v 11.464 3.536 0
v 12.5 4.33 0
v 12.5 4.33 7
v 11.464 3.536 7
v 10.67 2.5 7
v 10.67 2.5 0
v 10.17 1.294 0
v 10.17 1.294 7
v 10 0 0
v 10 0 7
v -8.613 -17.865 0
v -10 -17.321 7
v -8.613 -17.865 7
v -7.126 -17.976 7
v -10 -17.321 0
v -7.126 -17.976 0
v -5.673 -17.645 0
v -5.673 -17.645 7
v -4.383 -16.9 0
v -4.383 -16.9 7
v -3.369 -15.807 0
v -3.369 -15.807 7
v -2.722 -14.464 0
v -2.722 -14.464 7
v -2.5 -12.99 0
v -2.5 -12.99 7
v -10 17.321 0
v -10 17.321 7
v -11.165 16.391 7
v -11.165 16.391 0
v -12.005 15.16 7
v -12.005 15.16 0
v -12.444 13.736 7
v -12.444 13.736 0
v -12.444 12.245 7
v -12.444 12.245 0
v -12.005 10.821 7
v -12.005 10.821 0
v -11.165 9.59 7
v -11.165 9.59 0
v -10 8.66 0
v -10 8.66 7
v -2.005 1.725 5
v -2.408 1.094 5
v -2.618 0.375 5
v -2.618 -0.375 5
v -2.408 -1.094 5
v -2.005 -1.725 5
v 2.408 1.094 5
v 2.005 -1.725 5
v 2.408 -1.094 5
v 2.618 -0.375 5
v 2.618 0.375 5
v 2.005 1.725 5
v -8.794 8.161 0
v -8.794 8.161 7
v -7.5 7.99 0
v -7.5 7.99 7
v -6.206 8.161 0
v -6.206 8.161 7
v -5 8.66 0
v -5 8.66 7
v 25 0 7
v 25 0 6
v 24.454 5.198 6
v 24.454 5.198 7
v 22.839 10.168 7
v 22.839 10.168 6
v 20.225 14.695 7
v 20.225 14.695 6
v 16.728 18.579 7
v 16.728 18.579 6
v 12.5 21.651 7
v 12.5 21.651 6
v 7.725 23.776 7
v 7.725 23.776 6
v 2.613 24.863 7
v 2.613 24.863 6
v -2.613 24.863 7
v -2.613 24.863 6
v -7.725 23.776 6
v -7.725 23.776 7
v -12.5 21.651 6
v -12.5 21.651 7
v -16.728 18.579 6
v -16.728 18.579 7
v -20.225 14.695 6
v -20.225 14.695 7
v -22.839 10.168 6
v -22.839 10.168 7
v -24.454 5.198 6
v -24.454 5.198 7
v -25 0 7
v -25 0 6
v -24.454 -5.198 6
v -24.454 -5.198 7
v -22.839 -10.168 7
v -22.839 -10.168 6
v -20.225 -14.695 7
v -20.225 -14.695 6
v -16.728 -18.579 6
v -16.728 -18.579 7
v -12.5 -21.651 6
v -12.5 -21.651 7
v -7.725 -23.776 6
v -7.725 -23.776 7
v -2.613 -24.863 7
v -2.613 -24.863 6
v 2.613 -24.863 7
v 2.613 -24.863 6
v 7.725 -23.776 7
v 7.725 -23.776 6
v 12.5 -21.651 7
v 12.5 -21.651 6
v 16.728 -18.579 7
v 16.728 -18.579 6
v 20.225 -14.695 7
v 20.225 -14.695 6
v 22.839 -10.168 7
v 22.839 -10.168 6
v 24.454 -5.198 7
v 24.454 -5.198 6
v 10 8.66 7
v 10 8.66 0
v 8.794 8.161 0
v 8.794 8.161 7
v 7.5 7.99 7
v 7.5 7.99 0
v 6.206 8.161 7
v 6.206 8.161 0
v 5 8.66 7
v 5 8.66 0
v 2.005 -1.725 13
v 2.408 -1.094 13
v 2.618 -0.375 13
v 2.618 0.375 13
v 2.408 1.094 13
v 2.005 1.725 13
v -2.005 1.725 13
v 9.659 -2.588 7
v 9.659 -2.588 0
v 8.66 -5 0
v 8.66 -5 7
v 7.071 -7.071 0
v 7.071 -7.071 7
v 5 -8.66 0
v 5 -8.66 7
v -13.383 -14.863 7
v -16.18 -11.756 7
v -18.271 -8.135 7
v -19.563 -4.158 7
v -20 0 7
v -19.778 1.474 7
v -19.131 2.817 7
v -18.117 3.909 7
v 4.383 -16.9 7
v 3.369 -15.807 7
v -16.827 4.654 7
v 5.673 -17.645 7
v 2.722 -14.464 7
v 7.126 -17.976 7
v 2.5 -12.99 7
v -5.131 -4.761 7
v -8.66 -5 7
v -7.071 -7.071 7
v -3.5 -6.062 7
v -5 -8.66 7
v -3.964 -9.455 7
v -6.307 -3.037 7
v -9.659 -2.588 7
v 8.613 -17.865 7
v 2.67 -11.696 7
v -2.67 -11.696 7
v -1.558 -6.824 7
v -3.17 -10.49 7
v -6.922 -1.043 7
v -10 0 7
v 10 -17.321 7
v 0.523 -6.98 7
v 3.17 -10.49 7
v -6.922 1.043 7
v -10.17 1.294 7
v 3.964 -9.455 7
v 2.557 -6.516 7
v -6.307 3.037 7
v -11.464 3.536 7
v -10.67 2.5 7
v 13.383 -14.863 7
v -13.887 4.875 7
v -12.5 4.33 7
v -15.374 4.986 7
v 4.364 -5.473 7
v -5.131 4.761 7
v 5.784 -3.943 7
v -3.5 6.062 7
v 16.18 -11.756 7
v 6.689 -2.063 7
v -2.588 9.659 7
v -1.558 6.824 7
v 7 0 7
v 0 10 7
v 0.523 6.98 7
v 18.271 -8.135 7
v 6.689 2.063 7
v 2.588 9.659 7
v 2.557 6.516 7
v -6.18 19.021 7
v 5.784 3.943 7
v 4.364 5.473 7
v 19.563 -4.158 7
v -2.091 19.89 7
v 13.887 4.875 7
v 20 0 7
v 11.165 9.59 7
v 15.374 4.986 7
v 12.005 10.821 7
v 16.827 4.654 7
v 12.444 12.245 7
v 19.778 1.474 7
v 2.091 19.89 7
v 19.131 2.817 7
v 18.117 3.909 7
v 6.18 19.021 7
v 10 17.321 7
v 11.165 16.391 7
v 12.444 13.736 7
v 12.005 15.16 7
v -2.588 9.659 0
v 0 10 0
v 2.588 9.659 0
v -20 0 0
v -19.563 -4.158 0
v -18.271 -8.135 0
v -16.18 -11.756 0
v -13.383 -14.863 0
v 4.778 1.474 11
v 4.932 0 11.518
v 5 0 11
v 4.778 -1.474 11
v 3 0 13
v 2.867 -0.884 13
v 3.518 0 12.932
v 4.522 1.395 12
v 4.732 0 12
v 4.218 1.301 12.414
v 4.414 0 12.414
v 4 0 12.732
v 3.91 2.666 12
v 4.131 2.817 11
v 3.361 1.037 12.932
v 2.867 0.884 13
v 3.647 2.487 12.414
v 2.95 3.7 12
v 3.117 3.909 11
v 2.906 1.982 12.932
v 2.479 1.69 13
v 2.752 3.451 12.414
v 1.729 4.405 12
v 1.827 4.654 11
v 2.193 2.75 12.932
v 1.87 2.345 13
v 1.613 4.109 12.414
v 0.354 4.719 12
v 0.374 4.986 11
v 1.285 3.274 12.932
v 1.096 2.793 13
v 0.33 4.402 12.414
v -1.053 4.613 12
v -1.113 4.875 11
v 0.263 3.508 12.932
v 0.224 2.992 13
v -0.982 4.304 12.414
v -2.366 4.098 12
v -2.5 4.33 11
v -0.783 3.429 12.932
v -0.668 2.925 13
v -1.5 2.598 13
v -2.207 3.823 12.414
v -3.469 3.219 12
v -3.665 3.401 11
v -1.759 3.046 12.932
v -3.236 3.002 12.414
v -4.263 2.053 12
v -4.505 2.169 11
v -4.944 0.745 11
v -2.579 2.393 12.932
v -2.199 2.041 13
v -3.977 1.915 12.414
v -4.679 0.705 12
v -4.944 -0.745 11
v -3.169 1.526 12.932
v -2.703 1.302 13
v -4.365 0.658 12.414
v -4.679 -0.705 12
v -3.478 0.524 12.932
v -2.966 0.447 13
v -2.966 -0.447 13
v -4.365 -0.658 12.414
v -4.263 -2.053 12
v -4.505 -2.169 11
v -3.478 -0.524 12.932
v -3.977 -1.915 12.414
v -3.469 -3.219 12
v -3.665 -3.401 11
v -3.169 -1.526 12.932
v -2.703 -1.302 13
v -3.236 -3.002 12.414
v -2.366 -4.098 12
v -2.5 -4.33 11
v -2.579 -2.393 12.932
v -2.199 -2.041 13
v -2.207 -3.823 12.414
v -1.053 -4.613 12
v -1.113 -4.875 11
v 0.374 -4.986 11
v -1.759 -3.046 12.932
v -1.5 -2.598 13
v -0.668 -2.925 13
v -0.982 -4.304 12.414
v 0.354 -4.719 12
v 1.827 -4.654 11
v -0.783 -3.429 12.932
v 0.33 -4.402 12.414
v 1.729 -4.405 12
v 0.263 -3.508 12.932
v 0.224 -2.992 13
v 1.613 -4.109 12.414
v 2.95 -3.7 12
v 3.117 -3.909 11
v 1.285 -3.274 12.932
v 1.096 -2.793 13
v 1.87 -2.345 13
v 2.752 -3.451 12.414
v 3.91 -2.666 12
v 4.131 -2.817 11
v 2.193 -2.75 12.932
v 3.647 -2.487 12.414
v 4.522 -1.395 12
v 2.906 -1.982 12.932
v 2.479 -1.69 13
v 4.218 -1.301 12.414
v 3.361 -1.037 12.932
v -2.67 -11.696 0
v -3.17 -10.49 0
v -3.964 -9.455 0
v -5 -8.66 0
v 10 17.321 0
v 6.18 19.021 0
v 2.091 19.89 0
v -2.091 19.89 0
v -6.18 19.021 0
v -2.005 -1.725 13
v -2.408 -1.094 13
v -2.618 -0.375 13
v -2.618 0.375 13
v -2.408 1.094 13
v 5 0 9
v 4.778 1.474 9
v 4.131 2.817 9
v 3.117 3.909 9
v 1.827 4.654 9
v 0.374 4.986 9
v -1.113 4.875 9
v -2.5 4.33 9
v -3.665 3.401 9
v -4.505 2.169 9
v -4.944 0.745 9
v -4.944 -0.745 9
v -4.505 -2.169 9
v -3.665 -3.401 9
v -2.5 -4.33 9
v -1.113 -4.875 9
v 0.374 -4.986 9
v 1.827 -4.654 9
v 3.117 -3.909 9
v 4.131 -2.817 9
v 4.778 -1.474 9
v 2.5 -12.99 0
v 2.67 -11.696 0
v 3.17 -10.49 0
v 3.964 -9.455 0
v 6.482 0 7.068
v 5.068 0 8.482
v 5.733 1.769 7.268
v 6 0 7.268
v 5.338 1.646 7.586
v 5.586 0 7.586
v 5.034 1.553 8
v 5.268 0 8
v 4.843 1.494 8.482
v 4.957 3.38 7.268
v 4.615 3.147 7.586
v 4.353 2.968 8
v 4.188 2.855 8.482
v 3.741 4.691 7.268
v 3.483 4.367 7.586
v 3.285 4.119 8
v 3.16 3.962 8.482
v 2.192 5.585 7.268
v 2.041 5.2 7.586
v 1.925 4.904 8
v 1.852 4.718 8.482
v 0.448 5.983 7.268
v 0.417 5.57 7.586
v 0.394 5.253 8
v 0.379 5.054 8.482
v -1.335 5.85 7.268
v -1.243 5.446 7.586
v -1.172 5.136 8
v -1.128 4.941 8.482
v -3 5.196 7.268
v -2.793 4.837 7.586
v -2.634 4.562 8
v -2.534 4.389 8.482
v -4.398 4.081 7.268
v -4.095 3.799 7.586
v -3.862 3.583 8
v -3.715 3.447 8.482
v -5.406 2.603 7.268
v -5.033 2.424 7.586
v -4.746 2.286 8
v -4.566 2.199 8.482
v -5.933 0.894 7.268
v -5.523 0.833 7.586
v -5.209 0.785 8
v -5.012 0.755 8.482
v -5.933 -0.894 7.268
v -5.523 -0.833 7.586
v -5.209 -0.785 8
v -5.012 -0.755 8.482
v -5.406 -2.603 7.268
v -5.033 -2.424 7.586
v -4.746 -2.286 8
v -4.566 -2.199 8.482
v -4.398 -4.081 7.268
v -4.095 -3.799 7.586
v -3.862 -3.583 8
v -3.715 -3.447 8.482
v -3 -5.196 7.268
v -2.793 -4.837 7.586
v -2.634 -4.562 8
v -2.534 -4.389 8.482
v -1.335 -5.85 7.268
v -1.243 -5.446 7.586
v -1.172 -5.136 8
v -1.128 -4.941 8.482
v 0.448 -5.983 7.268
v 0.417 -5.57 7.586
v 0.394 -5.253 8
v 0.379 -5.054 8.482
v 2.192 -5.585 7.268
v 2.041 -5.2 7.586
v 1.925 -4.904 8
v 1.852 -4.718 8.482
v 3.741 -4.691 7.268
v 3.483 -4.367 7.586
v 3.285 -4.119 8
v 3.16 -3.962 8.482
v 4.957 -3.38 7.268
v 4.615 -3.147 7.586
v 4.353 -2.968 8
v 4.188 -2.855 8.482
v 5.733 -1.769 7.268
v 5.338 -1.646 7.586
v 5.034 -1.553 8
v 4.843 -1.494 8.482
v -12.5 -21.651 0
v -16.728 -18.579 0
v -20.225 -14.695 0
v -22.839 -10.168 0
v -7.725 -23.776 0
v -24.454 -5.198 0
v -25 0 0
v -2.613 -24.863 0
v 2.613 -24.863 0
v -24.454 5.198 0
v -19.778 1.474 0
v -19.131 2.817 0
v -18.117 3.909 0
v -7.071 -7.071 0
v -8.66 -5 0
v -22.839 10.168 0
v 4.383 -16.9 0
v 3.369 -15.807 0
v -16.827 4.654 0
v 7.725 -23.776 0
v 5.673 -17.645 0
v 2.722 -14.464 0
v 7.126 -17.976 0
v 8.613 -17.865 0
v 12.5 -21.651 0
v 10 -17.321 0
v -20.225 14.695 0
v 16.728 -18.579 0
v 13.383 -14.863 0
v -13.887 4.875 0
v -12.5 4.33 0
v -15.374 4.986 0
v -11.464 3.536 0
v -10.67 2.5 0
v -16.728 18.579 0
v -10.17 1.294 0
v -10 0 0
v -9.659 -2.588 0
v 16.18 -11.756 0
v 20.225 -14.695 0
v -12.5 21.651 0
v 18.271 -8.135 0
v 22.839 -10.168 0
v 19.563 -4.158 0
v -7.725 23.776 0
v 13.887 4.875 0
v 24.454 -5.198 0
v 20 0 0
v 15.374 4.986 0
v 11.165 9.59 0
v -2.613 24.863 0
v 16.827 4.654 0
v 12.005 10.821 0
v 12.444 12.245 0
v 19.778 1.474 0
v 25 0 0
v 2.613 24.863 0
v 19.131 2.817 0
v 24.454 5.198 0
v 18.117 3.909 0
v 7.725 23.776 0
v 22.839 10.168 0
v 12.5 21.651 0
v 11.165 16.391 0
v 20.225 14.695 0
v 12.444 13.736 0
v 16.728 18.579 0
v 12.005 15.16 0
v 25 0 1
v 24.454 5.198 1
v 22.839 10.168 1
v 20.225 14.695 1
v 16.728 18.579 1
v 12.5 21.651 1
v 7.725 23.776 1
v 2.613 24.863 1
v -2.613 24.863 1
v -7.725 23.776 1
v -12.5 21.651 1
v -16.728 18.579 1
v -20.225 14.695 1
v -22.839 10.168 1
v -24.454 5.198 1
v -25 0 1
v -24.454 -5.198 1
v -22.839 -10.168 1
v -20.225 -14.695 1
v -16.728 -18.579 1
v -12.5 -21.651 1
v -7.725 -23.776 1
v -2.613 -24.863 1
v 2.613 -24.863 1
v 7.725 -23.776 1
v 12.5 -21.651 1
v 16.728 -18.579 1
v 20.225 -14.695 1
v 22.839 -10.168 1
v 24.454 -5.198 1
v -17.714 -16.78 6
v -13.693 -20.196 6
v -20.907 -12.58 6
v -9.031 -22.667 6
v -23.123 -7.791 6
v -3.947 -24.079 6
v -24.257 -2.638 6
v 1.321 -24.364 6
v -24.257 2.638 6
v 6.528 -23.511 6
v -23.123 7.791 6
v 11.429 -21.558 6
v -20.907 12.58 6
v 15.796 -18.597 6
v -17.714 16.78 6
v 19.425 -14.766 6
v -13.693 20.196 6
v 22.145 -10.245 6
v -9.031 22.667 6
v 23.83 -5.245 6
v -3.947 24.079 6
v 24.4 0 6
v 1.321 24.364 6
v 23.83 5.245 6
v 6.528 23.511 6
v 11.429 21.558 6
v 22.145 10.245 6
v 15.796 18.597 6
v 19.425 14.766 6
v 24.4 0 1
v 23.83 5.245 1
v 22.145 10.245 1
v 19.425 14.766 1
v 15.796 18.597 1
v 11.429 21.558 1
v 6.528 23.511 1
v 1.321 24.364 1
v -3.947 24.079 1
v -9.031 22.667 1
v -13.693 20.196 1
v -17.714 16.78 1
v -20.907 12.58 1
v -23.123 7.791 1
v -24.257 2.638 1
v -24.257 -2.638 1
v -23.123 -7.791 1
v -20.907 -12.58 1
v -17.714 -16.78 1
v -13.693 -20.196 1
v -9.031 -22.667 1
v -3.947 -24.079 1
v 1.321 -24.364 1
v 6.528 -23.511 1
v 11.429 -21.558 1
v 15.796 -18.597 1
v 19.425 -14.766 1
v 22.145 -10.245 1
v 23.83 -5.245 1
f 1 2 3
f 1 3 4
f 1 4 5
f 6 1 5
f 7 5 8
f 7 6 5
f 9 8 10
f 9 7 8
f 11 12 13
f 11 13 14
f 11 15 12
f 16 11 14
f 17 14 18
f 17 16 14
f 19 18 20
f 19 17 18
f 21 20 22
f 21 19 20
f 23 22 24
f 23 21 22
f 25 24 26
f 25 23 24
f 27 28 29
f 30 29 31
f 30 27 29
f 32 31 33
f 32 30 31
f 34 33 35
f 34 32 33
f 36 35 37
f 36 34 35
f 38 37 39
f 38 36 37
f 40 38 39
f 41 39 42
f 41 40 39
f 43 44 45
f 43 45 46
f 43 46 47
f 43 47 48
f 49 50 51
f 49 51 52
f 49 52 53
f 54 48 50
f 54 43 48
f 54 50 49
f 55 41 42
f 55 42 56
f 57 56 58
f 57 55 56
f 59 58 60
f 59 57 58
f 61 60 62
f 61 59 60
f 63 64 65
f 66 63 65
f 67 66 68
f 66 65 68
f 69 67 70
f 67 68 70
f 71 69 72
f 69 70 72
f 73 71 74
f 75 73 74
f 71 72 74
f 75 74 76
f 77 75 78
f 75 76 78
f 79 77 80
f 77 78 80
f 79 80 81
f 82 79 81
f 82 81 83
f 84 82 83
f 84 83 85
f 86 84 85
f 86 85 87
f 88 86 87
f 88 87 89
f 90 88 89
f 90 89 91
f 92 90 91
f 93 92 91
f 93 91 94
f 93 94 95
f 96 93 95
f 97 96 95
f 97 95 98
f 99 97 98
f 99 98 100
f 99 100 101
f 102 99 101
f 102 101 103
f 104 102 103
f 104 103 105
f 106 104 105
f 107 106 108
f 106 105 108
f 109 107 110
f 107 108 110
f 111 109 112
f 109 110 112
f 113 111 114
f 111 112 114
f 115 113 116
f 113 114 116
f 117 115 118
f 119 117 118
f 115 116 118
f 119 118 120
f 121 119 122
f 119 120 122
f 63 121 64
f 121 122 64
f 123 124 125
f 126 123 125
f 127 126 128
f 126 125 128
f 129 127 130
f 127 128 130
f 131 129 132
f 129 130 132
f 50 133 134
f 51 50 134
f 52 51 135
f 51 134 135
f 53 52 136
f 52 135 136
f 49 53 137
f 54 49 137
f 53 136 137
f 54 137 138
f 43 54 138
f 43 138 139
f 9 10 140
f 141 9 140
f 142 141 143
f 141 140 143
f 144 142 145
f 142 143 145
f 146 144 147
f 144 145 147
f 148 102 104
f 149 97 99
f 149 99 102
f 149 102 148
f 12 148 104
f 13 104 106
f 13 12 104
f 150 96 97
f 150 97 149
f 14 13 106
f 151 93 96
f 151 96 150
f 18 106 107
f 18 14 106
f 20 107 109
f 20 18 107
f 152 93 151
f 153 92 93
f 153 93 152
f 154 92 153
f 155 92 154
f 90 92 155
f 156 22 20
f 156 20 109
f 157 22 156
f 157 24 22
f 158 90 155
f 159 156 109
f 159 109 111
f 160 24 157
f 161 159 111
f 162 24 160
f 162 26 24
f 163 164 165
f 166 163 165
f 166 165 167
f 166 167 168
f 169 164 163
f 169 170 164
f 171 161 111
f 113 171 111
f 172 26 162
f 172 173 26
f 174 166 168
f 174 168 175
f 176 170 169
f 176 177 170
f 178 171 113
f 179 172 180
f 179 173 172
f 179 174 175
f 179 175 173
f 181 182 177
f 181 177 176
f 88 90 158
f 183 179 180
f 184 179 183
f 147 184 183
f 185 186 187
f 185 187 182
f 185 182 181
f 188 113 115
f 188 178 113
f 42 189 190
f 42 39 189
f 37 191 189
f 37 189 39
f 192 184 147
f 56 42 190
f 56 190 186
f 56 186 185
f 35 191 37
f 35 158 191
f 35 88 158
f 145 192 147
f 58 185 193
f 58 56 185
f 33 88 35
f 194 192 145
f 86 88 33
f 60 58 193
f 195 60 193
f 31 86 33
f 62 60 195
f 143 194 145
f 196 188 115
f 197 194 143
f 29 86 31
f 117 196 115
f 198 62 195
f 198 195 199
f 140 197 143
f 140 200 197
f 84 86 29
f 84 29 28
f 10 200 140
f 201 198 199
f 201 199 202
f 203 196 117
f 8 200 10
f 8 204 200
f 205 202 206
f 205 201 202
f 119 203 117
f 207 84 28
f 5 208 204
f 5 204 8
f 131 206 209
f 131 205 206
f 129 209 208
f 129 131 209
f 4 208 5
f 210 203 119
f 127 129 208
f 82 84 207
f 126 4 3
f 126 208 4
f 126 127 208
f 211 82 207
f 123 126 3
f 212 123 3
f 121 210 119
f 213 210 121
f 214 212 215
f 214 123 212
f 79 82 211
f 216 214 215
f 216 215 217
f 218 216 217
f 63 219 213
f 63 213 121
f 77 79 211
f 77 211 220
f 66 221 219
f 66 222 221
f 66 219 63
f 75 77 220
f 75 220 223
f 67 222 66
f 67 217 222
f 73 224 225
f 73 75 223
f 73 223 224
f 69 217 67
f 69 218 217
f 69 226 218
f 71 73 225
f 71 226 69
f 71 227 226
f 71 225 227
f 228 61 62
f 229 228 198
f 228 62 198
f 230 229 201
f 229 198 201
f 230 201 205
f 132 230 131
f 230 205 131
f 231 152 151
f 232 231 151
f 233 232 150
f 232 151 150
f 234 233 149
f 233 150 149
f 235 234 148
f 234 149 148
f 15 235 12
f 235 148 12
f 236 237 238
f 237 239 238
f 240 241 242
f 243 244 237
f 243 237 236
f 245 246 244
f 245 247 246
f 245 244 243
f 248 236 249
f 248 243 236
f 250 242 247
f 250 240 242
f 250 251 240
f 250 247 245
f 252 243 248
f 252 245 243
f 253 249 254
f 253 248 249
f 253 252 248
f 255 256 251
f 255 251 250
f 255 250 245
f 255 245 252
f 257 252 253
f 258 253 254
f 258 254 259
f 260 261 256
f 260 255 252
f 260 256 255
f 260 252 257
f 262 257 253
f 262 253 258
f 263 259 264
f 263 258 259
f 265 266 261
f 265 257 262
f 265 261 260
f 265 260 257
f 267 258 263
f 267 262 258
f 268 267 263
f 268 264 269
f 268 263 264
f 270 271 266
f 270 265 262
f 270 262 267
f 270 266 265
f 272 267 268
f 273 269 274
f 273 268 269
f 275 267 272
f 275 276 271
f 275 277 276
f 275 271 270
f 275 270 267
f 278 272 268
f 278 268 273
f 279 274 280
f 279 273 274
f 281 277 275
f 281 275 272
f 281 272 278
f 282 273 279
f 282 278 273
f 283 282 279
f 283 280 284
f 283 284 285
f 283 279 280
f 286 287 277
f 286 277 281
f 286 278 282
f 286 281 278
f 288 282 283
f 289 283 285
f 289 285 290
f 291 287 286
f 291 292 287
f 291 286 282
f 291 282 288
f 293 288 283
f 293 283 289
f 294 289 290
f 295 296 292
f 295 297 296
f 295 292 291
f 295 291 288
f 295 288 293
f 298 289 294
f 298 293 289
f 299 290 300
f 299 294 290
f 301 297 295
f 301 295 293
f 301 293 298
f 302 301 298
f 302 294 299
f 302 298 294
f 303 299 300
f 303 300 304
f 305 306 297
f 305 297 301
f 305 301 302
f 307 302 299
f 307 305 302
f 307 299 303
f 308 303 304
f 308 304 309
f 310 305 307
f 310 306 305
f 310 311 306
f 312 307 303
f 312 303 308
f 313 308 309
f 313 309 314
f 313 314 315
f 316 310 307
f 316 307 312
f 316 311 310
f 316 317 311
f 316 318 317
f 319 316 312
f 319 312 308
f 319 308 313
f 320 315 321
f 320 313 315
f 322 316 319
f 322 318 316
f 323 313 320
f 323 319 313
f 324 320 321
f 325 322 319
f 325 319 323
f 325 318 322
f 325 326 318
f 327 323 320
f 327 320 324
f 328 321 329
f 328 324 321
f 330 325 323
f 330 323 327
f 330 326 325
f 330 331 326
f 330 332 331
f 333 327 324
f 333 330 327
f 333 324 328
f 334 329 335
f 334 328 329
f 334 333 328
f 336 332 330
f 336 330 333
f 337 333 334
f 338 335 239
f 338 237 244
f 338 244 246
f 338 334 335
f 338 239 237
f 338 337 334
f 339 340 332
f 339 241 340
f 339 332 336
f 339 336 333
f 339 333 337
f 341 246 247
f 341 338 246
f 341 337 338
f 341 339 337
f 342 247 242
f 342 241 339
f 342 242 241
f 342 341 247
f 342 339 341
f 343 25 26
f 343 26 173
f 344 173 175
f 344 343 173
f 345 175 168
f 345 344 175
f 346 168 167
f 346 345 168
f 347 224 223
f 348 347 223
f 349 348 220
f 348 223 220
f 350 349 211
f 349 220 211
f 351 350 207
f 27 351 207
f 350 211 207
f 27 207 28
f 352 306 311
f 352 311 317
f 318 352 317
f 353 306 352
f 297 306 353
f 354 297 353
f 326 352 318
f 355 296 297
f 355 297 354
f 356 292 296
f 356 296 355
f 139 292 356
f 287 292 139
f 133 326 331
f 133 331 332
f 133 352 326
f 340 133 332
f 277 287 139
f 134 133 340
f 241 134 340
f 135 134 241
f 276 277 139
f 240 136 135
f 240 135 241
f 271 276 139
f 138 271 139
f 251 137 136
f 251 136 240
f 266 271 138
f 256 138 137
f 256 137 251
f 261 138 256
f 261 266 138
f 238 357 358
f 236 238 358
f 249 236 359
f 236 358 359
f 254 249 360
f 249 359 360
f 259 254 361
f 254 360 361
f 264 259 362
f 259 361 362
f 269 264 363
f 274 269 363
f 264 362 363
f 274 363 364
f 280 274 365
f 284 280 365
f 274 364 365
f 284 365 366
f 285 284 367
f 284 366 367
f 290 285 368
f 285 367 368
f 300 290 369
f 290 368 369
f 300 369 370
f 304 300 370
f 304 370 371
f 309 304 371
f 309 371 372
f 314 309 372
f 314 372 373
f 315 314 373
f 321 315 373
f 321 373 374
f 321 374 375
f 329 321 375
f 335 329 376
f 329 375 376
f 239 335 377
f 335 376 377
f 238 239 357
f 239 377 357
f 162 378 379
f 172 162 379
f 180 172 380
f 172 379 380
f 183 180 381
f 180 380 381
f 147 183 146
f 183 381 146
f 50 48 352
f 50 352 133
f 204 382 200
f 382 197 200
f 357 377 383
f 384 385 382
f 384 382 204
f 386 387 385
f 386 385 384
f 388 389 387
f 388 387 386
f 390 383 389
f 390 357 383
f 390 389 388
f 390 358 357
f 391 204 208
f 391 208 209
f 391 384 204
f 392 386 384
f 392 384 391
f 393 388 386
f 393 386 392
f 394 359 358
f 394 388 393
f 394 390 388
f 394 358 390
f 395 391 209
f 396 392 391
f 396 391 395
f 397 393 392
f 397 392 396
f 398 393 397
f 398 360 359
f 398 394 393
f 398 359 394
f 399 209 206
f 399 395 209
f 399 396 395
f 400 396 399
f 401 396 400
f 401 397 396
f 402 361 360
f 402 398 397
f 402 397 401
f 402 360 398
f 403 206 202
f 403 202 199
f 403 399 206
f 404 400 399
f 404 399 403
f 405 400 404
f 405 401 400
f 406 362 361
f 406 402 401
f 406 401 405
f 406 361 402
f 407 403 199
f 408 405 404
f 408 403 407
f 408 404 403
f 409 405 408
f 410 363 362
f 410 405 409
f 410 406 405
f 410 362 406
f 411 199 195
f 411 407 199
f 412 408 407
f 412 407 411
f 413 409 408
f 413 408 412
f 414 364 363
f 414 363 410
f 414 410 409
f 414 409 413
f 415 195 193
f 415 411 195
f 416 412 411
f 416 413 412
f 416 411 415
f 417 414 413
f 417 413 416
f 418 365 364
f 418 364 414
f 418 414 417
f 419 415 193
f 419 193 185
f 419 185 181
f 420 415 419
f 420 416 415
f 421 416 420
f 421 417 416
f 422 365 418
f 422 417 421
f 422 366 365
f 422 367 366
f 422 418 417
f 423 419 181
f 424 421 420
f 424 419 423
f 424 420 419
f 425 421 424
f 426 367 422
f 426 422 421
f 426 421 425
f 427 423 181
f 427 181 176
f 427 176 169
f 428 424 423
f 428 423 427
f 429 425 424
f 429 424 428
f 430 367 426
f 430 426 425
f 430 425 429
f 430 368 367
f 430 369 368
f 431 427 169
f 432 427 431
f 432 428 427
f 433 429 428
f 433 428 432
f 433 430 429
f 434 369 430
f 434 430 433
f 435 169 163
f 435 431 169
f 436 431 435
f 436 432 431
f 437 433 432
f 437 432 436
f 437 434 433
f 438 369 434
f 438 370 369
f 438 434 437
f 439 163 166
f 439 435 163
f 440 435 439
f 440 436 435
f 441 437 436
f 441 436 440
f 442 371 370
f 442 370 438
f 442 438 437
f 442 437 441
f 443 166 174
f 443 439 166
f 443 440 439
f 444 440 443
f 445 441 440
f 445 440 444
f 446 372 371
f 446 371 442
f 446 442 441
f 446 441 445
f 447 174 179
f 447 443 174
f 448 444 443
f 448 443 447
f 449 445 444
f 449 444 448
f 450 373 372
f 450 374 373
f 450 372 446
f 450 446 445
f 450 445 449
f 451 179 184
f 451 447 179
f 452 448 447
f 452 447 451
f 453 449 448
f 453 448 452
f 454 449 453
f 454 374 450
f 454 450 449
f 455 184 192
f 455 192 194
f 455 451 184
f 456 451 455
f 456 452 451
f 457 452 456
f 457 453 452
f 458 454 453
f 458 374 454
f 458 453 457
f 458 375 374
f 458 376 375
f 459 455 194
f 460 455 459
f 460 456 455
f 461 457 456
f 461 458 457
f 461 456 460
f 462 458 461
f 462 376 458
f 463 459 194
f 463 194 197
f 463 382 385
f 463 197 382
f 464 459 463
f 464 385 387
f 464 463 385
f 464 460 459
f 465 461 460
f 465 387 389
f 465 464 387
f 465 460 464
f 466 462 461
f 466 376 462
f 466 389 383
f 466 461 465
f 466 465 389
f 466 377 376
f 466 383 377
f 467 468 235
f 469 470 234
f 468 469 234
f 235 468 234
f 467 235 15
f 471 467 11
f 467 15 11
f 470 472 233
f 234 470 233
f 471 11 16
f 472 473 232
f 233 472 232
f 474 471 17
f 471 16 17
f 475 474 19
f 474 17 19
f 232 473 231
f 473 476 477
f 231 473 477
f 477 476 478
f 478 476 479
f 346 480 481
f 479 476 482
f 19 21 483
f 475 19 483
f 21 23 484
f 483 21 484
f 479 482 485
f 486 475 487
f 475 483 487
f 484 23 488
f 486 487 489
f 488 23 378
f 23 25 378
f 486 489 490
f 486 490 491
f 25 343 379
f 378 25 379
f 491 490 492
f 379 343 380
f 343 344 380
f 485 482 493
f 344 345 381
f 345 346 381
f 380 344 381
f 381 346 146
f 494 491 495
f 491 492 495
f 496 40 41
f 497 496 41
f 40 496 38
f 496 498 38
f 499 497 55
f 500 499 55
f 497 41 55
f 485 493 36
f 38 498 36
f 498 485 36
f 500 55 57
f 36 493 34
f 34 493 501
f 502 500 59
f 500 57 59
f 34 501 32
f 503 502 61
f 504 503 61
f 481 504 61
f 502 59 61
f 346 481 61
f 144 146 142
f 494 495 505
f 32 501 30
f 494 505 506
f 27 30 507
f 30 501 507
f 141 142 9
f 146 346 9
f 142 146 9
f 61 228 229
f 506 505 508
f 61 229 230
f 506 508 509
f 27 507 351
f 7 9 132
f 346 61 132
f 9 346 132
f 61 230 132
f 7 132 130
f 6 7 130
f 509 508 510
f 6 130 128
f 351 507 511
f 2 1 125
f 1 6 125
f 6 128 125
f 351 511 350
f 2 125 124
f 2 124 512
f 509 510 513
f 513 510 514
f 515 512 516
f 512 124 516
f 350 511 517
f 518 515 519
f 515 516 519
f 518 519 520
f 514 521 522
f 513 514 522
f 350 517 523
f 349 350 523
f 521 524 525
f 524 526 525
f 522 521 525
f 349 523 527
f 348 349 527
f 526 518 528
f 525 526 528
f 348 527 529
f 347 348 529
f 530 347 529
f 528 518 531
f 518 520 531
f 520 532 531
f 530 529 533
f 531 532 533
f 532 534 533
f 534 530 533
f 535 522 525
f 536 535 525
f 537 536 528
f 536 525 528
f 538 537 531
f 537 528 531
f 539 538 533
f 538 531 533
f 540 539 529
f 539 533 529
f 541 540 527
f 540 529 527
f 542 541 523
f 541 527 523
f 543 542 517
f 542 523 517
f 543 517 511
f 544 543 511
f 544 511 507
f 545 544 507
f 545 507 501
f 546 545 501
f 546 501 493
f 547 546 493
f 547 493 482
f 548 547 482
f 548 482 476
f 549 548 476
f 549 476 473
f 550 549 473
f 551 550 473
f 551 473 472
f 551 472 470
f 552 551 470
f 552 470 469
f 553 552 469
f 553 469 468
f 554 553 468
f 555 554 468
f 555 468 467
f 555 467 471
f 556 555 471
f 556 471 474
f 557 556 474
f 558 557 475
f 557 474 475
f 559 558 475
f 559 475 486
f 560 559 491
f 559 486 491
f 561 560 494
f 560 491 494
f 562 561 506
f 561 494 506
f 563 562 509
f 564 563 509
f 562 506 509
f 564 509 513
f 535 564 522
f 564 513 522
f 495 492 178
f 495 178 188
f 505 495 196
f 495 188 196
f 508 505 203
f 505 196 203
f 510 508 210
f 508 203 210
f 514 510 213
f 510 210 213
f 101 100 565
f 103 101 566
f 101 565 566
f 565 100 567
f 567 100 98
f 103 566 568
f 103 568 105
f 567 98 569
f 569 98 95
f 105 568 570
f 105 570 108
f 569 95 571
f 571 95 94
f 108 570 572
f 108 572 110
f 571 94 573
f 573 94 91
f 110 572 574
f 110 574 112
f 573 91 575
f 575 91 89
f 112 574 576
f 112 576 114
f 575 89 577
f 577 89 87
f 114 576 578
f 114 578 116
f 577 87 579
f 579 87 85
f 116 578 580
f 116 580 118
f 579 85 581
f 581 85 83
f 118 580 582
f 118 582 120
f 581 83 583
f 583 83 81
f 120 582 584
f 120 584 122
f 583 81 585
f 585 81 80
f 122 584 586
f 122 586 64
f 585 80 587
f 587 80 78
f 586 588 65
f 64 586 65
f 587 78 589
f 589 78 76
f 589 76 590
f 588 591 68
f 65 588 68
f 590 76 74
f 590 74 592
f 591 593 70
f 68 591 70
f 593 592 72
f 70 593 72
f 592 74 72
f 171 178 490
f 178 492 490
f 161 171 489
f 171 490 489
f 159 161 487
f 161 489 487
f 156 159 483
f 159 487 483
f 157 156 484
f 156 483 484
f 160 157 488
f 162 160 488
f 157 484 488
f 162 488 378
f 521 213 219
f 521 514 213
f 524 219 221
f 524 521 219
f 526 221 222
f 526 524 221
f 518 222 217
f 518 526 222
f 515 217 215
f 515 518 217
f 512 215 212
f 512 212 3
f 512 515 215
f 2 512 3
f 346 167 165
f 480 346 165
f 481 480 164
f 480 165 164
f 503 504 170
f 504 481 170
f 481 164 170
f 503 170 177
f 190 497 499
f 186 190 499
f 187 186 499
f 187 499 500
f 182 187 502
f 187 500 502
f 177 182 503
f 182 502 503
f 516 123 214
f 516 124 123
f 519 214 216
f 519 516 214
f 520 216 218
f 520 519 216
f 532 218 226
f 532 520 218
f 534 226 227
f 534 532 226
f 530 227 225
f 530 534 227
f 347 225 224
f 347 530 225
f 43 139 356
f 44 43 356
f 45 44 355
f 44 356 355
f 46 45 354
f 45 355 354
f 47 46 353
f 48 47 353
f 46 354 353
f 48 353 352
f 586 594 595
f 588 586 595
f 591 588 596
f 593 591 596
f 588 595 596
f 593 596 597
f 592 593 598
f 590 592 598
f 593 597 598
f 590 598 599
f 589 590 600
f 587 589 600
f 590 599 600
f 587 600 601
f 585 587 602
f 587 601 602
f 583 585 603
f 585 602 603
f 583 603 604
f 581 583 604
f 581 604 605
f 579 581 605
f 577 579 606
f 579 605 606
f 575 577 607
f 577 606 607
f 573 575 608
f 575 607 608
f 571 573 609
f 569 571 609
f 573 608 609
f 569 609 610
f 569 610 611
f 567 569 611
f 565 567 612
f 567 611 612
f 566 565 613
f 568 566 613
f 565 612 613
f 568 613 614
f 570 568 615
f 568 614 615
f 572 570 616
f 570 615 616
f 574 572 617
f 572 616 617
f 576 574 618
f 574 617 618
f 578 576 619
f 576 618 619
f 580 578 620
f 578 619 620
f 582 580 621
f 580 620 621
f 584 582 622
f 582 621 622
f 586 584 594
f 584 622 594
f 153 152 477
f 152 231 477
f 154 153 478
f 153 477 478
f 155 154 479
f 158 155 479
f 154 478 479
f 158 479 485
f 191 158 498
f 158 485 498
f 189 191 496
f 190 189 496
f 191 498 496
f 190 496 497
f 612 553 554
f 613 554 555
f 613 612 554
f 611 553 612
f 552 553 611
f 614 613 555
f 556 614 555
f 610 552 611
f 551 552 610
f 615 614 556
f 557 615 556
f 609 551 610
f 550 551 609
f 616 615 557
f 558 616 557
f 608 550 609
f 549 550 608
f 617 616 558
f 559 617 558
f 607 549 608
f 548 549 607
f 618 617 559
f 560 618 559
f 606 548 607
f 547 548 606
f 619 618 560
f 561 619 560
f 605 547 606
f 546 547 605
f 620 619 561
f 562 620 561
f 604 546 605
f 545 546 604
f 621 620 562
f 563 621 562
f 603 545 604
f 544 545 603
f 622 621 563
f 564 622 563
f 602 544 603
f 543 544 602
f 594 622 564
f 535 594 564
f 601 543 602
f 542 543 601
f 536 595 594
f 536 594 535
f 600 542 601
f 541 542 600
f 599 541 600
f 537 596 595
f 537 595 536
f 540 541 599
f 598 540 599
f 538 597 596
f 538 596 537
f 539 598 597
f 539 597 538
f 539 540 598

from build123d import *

# Parameters (mm, degrees)
F0_R         = 25
F1_DEPTH     = 7
F2_R         = 5
F3_DEPTH     = 6
F5_DEPTH     = 8
F7_R         = 25
F7_R_2       = 24.4
F8_DEPTH     = 5
F10_DEPTH    = 25
F11_R        = 5
F12_T1_DEPTH = 7
F13_R        = 2


# Not quite as in the source:
# - a fillet or chamfer that OpenCascade refuses, or shapes differently, is made with other operations: its cross-section is extruded or revolved along the edge and cut away or added


with BuildPart() as f1:
    # F0 (on Top) → F1 (new body)
    with BuildSketch(Plane.XY):
        Circle(F0_R)
    extrude(amount=F1_DEPTH)

    # F2 (on face) → F3 (join)
    with BuildSketch(Plane.XY.offset(7)):
        Circle(F2_R)
    extrude(amount=F3_DEPTH)

    # F4 (on face) → F5 (cut)
    with BuildSketch(Plane.XY.offset(13)):
        with BuildLine():
            Line((2.005093514, 1.725), (-2.005093514, 1.725))
            ThreePointArc((-2.005093514, 1.725), (-2.645, 0), (-2.005093514, -1.725))
            Line((-2.005093514, -1.725), (2.005093514, -1.725))
            ThreePointArc((2.005093514, -1.725), (2.645, 0), (2.005093514, 1.725))
        make_face()
    extrude(amount=-F5_DEPTH, mode=Mode.SUBTRACT)

    # F7 (on offset) → F8 (cut)
    with BuildSketch(Plane.XY.offset(1)):
        Circle(F7_R)
        Circle(F7_R_2, mode=Mode.SUBTRACT)
    extrude(amount=F8_DEPTH, mode=Mode.SUBTRACT)

    # F9 (on face) → F10 (cut)
    with BuildSketch(Plane.XY.offset(7)):
        with BuildLine():
            Line((7.1352549156, 7.0062926922), (15.9346604169, 12.0866318271))
            ThreePointArc((15.9346604169, 12.0866318271), (0, 20.0000017881), (-15.9346604169, 12.0866318271))
            Line((-15.9346604169, 12.0866318271), (-7.1352549156, 7.0062926922))
            ThreePointArc((-7.1352549156, 7.0062926922), (0, 10), (7.1352549156, 7.0062926922))
        make_face()
        with BuildLine():
            ThreePointArc((2.5, -19.8431366353), (15.0000012666, -13.2287578225), (20.0000017881, 0))
            ThreePointArc((20.0000017881, 0), (19.6047610649, 3.9564397015), (18.4346604169, 7.7565048082))
            Line((18.4346604169, 7.7565048082), (9.6352549156, 2.6761656733))
            ThreePointArc((9.6352549156, 2.6761656733), (9.9083941473, 1.3504537837), (10, 0))
            ThreePointArc((10, 0), (7.9056941504, -6.123724357), (2.5, -9.6824583655))
            Line((2.5, -9.6824583655), (2.5, -19.8431366353))
        make_face()
        with BuildLine():
            ThreePointArc((-18.4346604169, 7.7565048082), (-17.3205096243, -10.0000008941), (-2.5, -19.8431366353))
            Line((-2.5, -19.8431366353), (-2.5, -9.6824583655))
            ThreePointArc((-2.5, -9.6824583655), (-8.6602540378, -5), (-9.6352549156, 2.6761656733))
            Line((-9.6352549156, 2.6761656733), (-18.4346604169, 7.7565048082))
        make_face()
    extrude(amount=-F10_DEPTH, mode=Mode.SUBTRACT)

    # F11
    f11_edges = [f1.edges().sort_by_distance(p)[0] for p in [
        (-18.43466, 7.756505, 3.5),
        (-15.93466, 12.086632, 3.5),
        (15.93466, 12.086632, 3.5),
        (18.43466, 7.756505, 3.5),
        (2.5, -19.843137, 3.5),
        (-2.5, -19.843137, 3.5),
    ]]
    fillet(f11_edges, radius=F11_R)

    # F12: fillet of radius 5 on 6 edges, made by hand

    # F12_s2 → F12_t1 (join)
    with BuildSketch(Plane.XY):
        with BuildLine():
            ThreePointArc((-12.5, 4.3301270189), (-10.6698729811, 2.5), (-10, 0))
            ThreePointArc((-10, 0), (-9.9083941473, 1.3504537837), (-9.6352549156, 2.6761656733))
            Line((-9.6352549156, 2.6761656733), (-12.5, 4.3301270189))
        make_face()
        with BuildLine():
            ThreePointArc((-2.5, -12.9903810568), (-3.1698729811, -10.4903810568), (-5, -8.6602540378))
            ThreePointArc((-5, -8.6602540378), (-3.7846697903, -9.2561479341), (-2.5, -9.6824583655))
            Line((-2.5, -9.6824583655), (-2.5, -12.9903810568))
        make_face()
        with BuildLine():
            ThreePointArc((2.5, -12.9903810568), (3.1698729811, -10.4903810568), (5, -8.6602540378))
            ThreePointArc((5, -8.6602540378), (3.7846697903, -9.2561479341), (2.5, -9.6824583655))
            Line((2.5, -9.6824583655), (2.5, -12.9903810568))
        make_face()
        with BuildLine():
            ThreePointArc((12.5, 4.3301270189), (10.6698729811, 2.5), (10, 0))
            ThreePointArc((10, 0), (9.9083941473, 1.3504537837), (9.6352549156, 2.6761656733))
            Line((9.6352549156, 2.6761656733), (12.5, 4.3301270189))
        make_face()
        with BuildLine():
            ThreePointArc((10, 8.6602540378), (7.5, 7.9903810568), (5, 8.6602540378))
            ThreePointArc((5, 8.6602540378), (6.123724357, 7.9056941504), (7.1352549156, 7.0062926922))
            Line((7.1352549156, 7.0062926922), (10, 8.6602540378))
        make_face()
        with BuildLine():
            ThreePointArc((-10, 8.6602540378), (-7.5, 7.9903810568), (-5, 8.6602540378))
            ThreePointArc((-5, 8.6602540378), (-6.123724357, 7.9056941504), (-7.1352549156, 7.0062926922))
            Line((-7.1352549156, 7.0062926922), (-10, 8.6602540378))
        make_face()
    extrude(amount=F12_T1_DEPTH)

    # F13
    f13_edges = [f1.edges().sort_by_distance(p)[0] for p in [
        (-5, 0, 7),
        (-5, 0, 13),
    ]]
    fillet(f13_edges, radius=F13_R)


solid = f1.part
